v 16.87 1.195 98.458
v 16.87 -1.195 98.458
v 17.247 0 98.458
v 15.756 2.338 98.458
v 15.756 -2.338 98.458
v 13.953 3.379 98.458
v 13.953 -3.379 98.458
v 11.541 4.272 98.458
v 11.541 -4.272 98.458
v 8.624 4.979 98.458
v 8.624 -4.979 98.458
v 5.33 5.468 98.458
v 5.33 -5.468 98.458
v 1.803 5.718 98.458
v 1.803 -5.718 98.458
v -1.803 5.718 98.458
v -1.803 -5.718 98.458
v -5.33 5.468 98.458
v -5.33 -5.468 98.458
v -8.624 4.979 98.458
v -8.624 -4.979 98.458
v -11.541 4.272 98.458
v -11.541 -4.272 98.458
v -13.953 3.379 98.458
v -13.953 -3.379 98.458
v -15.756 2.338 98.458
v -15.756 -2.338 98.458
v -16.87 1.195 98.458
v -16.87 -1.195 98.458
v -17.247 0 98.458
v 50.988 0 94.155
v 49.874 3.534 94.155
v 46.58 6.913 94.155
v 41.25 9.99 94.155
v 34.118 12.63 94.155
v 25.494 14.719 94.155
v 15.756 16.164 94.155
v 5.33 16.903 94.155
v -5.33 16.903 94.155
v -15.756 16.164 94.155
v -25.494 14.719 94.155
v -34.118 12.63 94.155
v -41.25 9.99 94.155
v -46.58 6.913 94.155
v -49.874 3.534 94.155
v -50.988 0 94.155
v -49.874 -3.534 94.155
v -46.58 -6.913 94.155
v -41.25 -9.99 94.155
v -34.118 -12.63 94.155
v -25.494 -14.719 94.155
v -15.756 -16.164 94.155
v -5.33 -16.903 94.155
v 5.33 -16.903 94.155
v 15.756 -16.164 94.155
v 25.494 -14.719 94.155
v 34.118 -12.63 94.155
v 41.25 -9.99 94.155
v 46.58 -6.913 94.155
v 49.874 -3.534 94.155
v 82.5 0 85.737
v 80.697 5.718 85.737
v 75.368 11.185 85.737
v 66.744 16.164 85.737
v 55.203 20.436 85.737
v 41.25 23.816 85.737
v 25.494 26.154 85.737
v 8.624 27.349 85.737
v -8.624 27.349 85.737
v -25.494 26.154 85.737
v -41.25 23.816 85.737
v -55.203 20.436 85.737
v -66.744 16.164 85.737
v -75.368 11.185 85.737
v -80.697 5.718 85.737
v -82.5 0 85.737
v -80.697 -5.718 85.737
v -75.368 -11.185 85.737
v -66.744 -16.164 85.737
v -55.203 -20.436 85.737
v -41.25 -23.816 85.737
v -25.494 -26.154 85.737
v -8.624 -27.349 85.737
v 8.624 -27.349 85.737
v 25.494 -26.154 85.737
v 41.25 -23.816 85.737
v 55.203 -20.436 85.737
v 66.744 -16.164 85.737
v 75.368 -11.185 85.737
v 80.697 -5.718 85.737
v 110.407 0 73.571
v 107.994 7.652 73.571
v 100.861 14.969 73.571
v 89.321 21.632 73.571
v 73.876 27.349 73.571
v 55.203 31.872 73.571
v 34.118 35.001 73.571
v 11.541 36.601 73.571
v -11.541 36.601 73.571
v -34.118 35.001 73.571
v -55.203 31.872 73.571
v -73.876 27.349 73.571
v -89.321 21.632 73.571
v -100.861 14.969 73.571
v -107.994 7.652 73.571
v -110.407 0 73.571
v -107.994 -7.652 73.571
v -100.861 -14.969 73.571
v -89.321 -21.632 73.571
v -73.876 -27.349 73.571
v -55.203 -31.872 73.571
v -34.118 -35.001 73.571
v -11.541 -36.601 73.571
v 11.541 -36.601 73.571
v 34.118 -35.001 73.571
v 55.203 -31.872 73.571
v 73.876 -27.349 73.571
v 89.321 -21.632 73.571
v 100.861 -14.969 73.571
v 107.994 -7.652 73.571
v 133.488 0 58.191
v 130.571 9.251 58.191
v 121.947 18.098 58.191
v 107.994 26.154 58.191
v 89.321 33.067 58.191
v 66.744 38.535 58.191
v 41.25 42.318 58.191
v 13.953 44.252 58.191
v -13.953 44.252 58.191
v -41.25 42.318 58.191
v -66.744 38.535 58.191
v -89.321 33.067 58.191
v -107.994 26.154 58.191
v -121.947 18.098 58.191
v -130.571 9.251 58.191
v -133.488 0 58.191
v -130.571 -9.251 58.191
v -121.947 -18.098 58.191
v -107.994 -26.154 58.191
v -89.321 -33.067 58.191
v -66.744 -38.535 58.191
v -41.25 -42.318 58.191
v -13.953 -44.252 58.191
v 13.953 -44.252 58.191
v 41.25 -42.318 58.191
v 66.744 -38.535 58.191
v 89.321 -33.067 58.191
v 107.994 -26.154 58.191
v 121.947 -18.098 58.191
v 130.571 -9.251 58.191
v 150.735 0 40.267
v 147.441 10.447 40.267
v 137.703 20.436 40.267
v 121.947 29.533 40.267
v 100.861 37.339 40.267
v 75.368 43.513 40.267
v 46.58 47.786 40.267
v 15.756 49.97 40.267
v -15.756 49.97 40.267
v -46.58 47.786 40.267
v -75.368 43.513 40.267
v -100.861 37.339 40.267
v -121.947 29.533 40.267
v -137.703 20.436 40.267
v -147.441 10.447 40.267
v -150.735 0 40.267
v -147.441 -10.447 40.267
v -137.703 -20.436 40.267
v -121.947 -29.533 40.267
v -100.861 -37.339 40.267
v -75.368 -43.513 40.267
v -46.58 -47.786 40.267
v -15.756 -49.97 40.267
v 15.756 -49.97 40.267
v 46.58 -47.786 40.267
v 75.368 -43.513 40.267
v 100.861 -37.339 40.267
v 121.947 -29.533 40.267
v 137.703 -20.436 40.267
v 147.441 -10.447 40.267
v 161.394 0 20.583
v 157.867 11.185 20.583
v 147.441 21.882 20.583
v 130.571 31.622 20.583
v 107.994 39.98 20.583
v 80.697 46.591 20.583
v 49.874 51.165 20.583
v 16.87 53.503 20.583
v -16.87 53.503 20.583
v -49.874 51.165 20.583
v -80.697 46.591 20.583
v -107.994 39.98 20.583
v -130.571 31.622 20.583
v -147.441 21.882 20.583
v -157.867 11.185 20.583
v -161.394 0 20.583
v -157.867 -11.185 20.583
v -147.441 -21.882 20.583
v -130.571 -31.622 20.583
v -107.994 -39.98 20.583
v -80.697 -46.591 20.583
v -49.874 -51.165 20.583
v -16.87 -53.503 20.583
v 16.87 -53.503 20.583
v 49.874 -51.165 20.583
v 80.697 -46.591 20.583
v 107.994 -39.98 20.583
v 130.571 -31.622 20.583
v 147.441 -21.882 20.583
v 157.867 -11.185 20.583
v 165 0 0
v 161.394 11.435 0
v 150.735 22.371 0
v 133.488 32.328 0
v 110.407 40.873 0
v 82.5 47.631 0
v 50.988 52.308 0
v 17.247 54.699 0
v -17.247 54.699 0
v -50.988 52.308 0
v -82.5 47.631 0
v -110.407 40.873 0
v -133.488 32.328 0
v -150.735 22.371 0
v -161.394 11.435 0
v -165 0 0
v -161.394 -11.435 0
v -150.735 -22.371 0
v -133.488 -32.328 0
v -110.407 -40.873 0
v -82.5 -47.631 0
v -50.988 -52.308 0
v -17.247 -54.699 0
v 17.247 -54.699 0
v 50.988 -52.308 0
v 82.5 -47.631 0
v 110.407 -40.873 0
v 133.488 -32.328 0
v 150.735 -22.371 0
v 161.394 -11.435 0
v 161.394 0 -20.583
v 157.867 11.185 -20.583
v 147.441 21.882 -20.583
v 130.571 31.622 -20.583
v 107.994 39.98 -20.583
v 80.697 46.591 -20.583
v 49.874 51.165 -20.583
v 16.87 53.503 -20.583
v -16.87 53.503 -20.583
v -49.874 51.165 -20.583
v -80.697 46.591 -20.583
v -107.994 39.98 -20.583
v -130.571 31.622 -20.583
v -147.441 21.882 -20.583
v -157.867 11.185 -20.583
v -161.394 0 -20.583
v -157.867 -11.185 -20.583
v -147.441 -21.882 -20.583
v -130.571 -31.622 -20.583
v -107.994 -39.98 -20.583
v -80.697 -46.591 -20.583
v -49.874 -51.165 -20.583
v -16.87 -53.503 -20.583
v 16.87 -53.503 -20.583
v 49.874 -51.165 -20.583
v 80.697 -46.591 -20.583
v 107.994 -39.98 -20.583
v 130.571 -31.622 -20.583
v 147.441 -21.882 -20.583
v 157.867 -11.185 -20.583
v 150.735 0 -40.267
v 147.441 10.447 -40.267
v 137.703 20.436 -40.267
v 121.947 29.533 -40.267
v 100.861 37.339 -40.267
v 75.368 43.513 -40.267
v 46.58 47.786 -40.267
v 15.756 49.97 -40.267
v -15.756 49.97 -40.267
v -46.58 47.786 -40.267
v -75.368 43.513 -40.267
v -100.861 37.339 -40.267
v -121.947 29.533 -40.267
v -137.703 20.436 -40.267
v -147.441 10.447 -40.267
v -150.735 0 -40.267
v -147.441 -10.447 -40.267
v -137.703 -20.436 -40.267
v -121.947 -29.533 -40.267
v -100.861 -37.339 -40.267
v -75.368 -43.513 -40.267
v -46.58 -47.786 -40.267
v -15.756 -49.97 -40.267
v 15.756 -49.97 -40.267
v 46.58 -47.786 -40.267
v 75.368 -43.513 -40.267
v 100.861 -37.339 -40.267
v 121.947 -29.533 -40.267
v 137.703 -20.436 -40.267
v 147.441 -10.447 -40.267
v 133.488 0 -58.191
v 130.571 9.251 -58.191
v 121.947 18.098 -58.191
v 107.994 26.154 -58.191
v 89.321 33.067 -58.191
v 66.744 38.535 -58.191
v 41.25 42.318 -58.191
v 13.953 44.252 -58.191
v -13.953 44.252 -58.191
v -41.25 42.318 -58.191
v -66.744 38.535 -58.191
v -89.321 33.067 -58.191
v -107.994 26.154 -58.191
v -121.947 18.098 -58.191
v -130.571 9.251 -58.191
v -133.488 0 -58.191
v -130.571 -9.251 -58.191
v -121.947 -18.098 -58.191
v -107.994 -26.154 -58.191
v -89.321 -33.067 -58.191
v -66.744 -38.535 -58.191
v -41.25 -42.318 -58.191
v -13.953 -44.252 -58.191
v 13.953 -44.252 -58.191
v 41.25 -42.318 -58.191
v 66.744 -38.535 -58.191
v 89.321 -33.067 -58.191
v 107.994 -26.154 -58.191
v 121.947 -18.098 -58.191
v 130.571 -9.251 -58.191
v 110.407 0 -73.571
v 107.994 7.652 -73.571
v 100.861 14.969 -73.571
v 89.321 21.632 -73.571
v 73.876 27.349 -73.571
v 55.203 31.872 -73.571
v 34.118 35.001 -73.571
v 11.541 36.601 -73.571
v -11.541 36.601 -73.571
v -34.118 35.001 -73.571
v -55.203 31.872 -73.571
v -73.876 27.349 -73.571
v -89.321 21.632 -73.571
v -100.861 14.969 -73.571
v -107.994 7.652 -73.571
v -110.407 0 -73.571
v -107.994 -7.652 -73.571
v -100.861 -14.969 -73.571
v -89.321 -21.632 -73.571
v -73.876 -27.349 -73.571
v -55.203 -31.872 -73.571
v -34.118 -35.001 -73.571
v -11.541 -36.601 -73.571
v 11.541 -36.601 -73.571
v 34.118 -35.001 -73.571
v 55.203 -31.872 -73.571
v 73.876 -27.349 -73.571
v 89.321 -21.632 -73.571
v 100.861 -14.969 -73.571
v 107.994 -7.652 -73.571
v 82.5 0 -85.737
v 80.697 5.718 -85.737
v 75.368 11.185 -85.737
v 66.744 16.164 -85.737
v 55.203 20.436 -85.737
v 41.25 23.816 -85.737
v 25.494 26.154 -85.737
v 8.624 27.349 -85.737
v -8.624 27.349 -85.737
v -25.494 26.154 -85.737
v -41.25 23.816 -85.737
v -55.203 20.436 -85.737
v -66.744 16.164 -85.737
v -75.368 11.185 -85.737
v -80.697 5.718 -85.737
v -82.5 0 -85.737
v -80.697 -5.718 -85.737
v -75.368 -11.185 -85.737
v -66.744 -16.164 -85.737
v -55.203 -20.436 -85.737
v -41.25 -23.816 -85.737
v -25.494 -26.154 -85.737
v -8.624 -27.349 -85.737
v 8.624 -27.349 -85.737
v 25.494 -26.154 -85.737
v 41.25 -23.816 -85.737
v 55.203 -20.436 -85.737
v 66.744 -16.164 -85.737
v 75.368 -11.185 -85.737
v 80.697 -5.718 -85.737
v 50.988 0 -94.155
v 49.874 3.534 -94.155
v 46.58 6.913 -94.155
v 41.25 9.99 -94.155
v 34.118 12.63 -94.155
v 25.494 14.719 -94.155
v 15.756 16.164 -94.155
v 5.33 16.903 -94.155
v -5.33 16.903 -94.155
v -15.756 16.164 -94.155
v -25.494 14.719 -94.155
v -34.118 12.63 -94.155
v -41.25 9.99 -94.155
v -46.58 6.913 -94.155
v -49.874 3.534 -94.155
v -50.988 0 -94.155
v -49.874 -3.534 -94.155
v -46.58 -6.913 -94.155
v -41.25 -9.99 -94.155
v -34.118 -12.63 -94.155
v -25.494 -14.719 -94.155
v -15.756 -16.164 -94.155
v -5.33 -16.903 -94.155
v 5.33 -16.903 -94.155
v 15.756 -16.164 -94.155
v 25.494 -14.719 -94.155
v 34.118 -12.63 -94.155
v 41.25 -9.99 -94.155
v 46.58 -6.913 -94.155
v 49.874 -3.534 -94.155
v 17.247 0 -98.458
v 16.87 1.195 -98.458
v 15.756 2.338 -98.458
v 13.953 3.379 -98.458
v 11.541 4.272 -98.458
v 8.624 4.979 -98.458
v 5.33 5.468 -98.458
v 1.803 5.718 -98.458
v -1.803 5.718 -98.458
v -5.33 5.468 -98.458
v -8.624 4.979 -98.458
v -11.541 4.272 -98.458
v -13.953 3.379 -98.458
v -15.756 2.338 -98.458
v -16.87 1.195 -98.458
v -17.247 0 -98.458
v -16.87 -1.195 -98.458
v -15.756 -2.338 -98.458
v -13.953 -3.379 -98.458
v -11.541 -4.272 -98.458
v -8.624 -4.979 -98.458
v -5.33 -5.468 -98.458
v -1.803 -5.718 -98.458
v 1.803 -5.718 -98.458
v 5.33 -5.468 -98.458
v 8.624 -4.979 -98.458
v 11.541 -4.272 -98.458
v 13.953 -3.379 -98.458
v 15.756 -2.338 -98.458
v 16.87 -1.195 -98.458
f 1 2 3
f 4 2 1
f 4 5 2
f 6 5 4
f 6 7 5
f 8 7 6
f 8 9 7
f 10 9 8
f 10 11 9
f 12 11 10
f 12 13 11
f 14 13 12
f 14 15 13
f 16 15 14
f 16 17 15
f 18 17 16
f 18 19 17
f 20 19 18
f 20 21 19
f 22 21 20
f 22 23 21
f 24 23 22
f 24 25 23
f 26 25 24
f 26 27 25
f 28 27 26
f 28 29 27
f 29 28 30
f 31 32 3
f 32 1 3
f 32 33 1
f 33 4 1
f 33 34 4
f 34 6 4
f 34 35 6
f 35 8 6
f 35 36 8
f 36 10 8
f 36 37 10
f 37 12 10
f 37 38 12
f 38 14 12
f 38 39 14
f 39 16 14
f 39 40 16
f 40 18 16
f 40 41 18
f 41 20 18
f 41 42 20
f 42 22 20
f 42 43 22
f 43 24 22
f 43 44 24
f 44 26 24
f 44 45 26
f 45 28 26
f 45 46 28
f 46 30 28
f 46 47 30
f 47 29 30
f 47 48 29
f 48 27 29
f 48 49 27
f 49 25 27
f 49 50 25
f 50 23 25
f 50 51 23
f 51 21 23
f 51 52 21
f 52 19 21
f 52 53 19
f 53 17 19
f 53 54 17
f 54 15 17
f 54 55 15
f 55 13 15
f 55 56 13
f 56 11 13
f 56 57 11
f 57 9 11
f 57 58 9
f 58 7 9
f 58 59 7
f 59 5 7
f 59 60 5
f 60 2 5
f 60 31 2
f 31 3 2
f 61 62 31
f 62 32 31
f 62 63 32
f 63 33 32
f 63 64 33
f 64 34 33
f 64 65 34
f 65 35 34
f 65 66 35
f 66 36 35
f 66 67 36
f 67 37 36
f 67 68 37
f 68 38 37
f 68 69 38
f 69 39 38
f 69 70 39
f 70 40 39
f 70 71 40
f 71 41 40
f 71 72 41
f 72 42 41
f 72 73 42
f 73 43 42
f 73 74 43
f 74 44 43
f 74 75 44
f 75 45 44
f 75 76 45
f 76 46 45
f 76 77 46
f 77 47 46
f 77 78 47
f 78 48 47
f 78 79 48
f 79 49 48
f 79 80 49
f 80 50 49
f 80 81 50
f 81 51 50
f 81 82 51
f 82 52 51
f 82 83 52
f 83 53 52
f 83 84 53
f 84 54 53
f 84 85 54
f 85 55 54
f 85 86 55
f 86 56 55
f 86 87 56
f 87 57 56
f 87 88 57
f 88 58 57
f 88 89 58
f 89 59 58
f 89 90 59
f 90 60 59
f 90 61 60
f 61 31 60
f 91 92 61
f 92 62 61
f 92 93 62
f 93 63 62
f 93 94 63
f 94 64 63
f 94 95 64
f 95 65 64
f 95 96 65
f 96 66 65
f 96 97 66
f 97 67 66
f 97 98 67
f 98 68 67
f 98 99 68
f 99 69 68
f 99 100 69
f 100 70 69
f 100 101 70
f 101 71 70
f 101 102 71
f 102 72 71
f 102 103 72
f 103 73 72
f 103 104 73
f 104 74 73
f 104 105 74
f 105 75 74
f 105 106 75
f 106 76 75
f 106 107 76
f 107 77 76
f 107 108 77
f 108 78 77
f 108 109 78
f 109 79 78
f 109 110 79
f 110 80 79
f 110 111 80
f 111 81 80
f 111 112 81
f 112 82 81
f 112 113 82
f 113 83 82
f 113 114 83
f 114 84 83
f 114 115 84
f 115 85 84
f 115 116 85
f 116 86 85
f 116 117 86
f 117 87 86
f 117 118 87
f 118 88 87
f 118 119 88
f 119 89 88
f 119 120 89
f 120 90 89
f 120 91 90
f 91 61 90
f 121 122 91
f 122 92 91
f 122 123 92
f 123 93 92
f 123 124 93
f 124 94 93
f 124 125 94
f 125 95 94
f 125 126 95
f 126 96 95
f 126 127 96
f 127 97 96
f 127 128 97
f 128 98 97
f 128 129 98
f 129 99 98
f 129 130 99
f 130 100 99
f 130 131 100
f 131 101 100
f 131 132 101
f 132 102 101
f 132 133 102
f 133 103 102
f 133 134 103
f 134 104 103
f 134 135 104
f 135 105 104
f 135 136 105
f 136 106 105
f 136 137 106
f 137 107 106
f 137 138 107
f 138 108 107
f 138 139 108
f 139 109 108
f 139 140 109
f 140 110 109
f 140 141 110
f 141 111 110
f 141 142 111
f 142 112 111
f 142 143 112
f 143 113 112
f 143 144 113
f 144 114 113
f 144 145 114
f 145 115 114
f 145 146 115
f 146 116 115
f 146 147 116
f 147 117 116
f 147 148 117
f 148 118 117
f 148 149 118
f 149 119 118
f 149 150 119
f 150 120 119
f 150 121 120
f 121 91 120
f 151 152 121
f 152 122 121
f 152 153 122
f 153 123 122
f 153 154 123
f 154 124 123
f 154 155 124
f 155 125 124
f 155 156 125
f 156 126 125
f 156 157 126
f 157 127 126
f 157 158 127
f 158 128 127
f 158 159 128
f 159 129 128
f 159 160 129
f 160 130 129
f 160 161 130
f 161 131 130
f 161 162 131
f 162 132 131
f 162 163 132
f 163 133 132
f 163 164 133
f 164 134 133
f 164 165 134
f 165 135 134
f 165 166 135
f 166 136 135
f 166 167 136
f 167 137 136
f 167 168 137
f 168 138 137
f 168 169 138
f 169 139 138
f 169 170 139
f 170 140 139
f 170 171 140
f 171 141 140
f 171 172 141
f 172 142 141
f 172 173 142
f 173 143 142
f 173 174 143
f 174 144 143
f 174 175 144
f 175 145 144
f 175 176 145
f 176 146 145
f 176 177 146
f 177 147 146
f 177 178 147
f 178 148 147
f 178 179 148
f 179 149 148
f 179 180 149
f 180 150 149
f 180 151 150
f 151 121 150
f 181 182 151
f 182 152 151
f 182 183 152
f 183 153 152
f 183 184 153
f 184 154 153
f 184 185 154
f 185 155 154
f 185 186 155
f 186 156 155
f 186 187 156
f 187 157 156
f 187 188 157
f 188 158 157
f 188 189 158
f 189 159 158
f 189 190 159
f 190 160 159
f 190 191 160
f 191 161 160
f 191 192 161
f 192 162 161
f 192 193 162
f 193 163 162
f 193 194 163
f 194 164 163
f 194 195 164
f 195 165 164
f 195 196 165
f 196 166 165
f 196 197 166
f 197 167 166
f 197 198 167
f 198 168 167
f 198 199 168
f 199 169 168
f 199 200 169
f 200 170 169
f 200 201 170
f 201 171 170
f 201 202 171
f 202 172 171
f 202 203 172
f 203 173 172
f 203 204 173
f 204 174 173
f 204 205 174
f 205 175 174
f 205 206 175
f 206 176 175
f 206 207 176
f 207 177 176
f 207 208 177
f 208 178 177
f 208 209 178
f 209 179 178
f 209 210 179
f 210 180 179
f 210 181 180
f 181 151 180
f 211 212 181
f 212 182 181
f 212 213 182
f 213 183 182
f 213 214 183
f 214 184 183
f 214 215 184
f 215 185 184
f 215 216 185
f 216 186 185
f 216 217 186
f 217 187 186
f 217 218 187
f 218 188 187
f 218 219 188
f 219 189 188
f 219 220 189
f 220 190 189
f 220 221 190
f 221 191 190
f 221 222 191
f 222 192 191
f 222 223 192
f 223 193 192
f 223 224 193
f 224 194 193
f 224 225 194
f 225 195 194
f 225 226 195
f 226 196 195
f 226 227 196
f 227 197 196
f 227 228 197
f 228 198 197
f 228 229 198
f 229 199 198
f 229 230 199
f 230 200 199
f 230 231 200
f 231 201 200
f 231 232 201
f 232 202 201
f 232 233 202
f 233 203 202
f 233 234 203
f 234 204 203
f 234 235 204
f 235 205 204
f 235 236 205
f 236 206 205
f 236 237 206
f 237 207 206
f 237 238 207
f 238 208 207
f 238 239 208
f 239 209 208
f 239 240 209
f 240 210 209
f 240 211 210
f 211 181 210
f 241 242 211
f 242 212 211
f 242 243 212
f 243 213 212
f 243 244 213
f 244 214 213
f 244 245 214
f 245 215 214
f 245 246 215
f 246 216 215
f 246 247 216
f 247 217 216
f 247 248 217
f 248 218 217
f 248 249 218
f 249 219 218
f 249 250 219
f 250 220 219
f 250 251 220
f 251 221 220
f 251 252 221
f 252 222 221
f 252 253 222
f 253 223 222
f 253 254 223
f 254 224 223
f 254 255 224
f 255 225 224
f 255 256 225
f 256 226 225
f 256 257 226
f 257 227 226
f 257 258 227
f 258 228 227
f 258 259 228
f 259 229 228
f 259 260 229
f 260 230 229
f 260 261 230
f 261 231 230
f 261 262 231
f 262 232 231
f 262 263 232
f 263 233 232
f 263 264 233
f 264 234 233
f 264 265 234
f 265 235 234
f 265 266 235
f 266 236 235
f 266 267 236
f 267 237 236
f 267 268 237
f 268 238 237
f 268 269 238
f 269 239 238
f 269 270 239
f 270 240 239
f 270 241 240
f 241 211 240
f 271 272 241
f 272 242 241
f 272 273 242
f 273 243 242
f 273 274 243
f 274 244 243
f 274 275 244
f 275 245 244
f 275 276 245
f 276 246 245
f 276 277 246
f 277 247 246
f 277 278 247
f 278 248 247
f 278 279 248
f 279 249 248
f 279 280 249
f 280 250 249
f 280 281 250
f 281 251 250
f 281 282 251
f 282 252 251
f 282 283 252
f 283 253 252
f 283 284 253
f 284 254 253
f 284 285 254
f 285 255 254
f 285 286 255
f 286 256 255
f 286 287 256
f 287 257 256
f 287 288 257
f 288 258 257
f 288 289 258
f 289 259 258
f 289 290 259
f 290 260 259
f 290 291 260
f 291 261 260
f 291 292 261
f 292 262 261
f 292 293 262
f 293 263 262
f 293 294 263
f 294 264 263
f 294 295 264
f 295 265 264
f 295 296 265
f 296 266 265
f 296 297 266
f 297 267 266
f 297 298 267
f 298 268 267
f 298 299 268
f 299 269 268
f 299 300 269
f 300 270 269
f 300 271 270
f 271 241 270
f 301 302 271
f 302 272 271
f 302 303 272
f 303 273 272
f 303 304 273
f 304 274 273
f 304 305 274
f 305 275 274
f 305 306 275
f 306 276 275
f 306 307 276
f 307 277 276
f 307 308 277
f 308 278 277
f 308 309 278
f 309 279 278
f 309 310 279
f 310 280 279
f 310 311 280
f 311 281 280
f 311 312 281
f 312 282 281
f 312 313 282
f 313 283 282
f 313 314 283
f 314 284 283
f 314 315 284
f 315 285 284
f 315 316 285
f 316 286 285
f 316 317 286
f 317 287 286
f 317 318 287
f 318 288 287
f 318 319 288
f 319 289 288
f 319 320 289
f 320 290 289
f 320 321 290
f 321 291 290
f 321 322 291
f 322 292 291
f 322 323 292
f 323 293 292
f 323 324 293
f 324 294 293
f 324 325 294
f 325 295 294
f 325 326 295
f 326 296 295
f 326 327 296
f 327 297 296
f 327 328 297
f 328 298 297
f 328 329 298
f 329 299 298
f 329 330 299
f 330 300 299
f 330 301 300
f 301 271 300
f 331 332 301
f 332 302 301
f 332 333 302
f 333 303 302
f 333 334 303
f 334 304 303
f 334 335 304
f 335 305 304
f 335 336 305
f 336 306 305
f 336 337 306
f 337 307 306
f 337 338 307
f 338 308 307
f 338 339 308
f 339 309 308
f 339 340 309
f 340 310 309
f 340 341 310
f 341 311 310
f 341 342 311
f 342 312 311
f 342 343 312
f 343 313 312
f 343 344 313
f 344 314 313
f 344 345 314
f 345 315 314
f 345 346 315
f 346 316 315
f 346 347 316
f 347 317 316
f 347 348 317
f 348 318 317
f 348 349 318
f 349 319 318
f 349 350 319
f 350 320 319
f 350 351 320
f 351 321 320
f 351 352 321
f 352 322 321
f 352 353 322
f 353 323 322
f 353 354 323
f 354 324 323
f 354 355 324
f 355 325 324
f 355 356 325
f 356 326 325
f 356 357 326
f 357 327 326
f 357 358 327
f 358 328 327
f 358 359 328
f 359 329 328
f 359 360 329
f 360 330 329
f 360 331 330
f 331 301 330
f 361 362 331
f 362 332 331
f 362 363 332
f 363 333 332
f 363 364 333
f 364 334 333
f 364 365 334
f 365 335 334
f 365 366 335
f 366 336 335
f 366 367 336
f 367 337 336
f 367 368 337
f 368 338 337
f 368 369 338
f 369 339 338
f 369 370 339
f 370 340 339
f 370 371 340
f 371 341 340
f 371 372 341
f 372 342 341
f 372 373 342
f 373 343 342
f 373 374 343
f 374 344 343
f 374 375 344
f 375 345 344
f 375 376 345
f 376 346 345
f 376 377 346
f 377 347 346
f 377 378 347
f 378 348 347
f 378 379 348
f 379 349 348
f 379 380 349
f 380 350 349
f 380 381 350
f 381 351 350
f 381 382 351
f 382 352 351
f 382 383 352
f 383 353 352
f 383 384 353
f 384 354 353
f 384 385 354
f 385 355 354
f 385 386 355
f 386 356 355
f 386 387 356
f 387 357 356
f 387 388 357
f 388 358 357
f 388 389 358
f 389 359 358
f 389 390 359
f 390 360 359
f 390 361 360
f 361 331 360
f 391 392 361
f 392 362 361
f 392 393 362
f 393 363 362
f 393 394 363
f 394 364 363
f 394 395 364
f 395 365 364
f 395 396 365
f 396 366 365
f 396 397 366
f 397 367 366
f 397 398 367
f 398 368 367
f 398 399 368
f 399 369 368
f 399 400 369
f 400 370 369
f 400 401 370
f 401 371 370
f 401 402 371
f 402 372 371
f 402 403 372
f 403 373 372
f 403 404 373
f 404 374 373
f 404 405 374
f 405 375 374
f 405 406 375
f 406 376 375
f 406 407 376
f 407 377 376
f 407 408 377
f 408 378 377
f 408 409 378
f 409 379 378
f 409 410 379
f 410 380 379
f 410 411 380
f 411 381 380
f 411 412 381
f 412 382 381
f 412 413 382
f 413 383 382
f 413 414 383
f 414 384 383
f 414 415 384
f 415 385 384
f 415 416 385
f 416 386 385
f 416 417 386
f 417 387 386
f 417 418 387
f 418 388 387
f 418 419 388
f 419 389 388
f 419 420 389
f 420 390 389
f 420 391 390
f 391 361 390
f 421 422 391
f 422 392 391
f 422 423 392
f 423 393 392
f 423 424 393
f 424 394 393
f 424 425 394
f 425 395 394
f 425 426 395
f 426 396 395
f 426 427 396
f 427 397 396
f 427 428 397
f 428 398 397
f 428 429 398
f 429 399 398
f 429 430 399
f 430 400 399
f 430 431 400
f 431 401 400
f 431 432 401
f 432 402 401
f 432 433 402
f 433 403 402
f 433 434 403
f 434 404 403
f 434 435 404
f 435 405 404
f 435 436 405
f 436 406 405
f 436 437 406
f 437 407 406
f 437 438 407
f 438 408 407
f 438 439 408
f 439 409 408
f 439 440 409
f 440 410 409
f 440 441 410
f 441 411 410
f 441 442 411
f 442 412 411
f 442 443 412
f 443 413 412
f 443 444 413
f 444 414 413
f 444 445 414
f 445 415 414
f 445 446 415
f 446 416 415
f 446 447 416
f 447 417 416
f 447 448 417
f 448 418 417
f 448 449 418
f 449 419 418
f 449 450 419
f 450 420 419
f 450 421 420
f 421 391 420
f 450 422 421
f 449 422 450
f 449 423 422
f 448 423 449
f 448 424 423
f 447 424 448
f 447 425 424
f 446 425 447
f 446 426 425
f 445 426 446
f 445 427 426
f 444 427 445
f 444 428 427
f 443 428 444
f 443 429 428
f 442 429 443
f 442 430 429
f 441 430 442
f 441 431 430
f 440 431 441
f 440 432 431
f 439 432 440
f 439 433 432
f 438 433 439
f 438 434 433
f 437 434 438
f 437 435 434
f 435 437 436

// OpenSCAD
// Generated by SolidPython 1.0.1 on 2020-07-29 00:46:51


scale(v = [15, 5, 9]) {
	sphere(r = 11);
}
/***********************************************
*********      SolidPython code:      **********
************************************************
 
# import packages: SolidPython
from solid import *
from solid.utils import *
from itertools import chain, combinations, permutations


class Resize:

    def __init__(self, scad_file):
        self.scad_file = scad_file
        #self.scad_file = import_scad(scad_file)
        # cone/cylinder param:
        self.r1 = 0
        self.r2 = 0
        self.h = 0
        # rectangular prism param:
        self.w = 0
        self.l = 0
        # ellipse param:
        self.r = 0

    # import OpenScad code (file name corresponds to shape)


    # classify shape + parameters
    def assign(self, param1, param2, param3):
        if self.scad_file == 'cone.scad':
            self.r1 = param1
            self.r2 = param2
            self.h = param3
        elif self.scad_file == 'cylinder.scad':
            self.r1 = param1
            self.r2 = param2
            self.h = param3
        elif self.scad_file == 'rectangularPrism.scad':
            self.h = param1
            self.l = param2
            self.w = param3
        else:
            self.r = param1
            self.h = param2

    # resize parameters
    def iterate(self):
        x = range(3, 20, 2)
        i = 1
        if self.scad_file == 'cone.scad':
            tempList = list(permutations(x, 2))
            for temp in tempList:
                param1 = temp[0]
                param2 = temp[1]
                filepath = 'produced_scad_files/' + 'cone' + str(param1) + '_' + str(param2) + '_' + '.scad'
                scad_render_to_file(cylinder(h=param1, r1=param2, r2=0), filepath)

        elif self.scad_file == 'cylinder.scad':
            tempList = list(permutations(x, 3))
            for temp in tempList:
                param1 = temp[0]
                param2 = temp[1]
                filepath = 'produced_scad_files/' + 'cylinder' + str(param1) + '_' + str(param2) + '_' + '.scad'
                scad_render_to_file(cylinder(h=param1, r1=param2, r2=param2), filepath)

        elif self.scad_file == 'rectangularPrism.scad':
            tempList = list(permutations(x, 3))
            for temp in tempList:
                param1 = temp[0]
                param2 = temp[1]
                param3 = temp[2]
                filepath = 'produced_scad_files/' + 'rectangularPrism' + str(param1) + '_' + str(param2) + '_' + str(
                    param3) + '.scad'
                scad_render_to_file(cube(size=(param1, param2, param3)), filepath)

        elif self.scad_file == 'ellipse.scad':
            tempList = list(permutations(x, 4))
            for temp in tempList:
                param1 = temp[0]
                param2 = temp[1]
                param3 = temp[2]
                param4 = temp[3]
                filepath = 'produced_scad_files/' + 'ellipse' + str(param1) + '_' + str(param2) + '_' + str(param3) + '_' + str(param4) + '.scad'
                scad_render_to_file(scale([param1, param2, param3])(sphere(r=param4)), filepath)

    def render_to_scadfile(self):
        scad_render_to_file(scad, 'example.scad') 
 
************************************************/
